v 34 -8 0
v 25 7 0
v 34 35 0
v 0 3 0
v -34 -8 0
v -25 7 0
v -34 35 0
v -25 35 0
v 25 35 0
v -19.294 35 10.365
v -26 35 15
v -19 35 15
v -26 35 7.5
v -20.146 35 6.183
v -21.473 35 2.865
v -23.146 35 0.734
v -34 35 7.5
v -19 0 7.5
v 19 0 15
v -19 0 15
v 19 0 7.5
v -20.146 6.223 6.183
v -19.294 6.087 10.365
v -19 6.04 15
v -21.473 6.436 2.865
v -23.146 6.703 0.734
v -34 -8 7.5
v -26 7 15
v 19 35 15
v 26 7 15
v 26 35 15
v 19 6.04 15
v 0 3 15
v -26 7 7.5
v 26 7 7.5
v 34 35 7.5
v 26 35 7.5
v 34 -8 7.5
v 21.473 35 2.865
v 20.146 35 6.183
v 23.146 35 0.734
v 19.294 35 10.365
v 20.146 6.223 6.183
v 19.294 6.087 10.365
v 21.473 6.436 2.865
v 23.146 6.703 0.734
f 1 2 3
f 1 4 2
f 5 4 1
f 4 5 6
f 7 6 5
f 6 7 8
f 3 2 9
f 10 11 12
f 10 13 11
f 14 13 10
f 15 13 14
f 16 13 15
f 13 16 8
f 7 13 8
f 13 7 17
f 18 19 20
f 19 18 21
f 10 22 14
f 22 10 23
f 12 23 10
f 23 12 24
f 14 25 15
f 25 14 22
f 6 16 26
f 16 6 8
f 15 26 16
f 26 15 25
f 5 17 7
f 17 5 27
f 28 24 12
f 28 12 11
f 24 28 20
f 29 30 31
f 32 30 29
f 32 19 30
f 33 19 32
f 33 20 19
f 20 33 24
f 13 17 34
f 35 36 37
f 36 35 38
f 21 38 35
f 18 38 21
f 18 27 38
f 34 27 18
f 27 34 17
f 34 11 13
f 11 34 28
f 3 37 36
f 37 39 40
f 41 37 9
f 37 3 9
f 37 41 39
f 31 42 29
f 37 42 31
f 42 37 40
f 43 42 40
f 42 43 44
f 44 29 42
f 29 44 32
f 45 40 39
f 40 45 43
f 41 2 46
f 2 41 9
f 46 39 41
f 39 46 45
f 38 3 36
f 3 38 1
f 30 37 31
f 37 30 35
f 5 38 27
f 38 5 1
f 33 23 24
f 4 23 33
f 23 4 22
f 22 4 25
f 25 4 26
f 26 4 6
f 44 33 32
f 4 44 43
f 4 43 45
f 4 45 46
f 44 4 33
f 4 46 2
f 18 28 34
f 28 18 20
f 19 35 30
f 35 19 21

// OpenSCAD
/* Params */

Ukulele_neck_width = 36; // Ukulele neck width
Guitar_stand_width = 50; // Guitar stand width
Guitar_stand_depth = 35; // Guitar stand depth 

Rounded_bevel_width = 6; 

// Which 
Stand_type = "Guitar Stand adaptor";  // ["Guitar Stand adaptor", "Wall mount"]

/* Computed vars */
cubX = 14+1;
cubY = Guitar_stand_depth;
cubZ = 14+1;
transX = 0.5*Ukulele_neck_width+1; // 1mm space on each side
cutX = 0.5*(Guitar_stand_width-Ukulele_neck_width);
cutZ = cubZ/2;
cutY = cubX-cutX;

/* Make Thing Happen */	
translate([0,0,cubZ]) rotate([0, 180, 0]) 
if (Stand_type == "Guitar Stand adaptor") {
	// Guitar adaptor : 
	difference() {
		union() {
			translate([transX, 0, 0]) side();
			translate([-transX, 0, 0]) mirror([1,0,0]) side();
			back(true);
		}
		// add Z bevel on back part
		translate([transX, 0,-cutZ]) rotate([0,0,-45]) cube([cubZ*2,cubZ*2,cubZ]);
		mirror() translate([transX, 0,-cutZ]) rotate([0,0,-45]) cube([cubZ*2,cubZ*2,cubZ]);
	}
} 
else 
{ 
	// wall mounted : thicken back and add a screw hole
	difference() {
		union() {
			translate([transX, 0, 0]) side();
			translate([-transX, 0, 0]) mirror([1,0,0]) side();
			back(false);
			
		}
		// Make hole for a screw (should be enough)
		translate([0,0,cubZ/2]) rotate([90,0,0]) 
			cylinder(h = cubY, r=2.4, $fn=20, center=true);
		translate([0,8,cubZ/2]) rotate([90,0,0]) 
			cylinder(h = cubY/2, r=4.8, $fn=20, center=true);
	}
}

// Part Modules
module side() { 
	sCubeS = [cubX, cubY, cubZ];
	difference() {
		cube(sCubeS);
		translate([cutX,0,-cutZ]) cube(sCubeS);
		sideProfile();
	}
}

module back(cutBack) { 
	backX = 2*(cubX+transX);
	alpha = asin(transX);
	overlapY = 4; // amount of circle overlapping cube
	/* Search the circle radius to reach overlap and width
	// R = a*b*c / (4S), where a,b,c are the edge triangle, S surf triangle
	// a*b = transX^2 * overlapY^2 , c = (2*transX)^2
	radius = (4* pow(transX,4) * pow(overlapY,2)) /(4*(transX*2*overlapY));
	*/
	rotX = atan(Rounded_bevel_width/cubZ); // not rounded here just bevelled
	
	translate([0,cutX,0])
	mirror([0,1,0])
	difference() {
		translate([-backX/2,0,0]) cube([backX, cubX, cubZ]);
		/*rotate([-rotX,0,0]) */
		linear_extrude(height = 3*cubZ, center = true, convexity = 10, twist = 0)
		polygon(points=[[-transX-Rounded_bevel_width,0],[transX+Rounded_bevel_width,0],[0,overlapY]], 
				 paths= [[0,1,2]]);
		if (cutBack) { translate([-backX/2,cutX,-cutZ]) cube([backX, cubX, cubZ]); }
	}
	//
	// translate([0, -radius+overlapY,0]) cylinder(r=radius, h=2*cubZ, $fn=100);
	/*difference() {
		cube(sCube, center=true);
		translate([12.5,0,-8]) cube(sCube, center=true);
		rotate([0, 35, 0]) translate([-22.5,0,0]) cube(sCube, center=true);
		translate([0,34,-8]) cube([30, 8, 20], center=true);
		translate([0,-34,-8]) cube([30, 8, 20], center=true);
	}*/
}

module sideProfile() {
	translate([Rounded_bevel_width,0,0])
	mirror()
	difference() {
		cube([cubX, cubY, cubZ]);
		translate([0,0.5*cubY,0]) rotate([90,0,0]) 
			scale([Rounded_bevel_width/cubZ, 1, 1]) cylinder(r=cubZ, h=cubY*2, center=true, $fn=20);
	}
}
